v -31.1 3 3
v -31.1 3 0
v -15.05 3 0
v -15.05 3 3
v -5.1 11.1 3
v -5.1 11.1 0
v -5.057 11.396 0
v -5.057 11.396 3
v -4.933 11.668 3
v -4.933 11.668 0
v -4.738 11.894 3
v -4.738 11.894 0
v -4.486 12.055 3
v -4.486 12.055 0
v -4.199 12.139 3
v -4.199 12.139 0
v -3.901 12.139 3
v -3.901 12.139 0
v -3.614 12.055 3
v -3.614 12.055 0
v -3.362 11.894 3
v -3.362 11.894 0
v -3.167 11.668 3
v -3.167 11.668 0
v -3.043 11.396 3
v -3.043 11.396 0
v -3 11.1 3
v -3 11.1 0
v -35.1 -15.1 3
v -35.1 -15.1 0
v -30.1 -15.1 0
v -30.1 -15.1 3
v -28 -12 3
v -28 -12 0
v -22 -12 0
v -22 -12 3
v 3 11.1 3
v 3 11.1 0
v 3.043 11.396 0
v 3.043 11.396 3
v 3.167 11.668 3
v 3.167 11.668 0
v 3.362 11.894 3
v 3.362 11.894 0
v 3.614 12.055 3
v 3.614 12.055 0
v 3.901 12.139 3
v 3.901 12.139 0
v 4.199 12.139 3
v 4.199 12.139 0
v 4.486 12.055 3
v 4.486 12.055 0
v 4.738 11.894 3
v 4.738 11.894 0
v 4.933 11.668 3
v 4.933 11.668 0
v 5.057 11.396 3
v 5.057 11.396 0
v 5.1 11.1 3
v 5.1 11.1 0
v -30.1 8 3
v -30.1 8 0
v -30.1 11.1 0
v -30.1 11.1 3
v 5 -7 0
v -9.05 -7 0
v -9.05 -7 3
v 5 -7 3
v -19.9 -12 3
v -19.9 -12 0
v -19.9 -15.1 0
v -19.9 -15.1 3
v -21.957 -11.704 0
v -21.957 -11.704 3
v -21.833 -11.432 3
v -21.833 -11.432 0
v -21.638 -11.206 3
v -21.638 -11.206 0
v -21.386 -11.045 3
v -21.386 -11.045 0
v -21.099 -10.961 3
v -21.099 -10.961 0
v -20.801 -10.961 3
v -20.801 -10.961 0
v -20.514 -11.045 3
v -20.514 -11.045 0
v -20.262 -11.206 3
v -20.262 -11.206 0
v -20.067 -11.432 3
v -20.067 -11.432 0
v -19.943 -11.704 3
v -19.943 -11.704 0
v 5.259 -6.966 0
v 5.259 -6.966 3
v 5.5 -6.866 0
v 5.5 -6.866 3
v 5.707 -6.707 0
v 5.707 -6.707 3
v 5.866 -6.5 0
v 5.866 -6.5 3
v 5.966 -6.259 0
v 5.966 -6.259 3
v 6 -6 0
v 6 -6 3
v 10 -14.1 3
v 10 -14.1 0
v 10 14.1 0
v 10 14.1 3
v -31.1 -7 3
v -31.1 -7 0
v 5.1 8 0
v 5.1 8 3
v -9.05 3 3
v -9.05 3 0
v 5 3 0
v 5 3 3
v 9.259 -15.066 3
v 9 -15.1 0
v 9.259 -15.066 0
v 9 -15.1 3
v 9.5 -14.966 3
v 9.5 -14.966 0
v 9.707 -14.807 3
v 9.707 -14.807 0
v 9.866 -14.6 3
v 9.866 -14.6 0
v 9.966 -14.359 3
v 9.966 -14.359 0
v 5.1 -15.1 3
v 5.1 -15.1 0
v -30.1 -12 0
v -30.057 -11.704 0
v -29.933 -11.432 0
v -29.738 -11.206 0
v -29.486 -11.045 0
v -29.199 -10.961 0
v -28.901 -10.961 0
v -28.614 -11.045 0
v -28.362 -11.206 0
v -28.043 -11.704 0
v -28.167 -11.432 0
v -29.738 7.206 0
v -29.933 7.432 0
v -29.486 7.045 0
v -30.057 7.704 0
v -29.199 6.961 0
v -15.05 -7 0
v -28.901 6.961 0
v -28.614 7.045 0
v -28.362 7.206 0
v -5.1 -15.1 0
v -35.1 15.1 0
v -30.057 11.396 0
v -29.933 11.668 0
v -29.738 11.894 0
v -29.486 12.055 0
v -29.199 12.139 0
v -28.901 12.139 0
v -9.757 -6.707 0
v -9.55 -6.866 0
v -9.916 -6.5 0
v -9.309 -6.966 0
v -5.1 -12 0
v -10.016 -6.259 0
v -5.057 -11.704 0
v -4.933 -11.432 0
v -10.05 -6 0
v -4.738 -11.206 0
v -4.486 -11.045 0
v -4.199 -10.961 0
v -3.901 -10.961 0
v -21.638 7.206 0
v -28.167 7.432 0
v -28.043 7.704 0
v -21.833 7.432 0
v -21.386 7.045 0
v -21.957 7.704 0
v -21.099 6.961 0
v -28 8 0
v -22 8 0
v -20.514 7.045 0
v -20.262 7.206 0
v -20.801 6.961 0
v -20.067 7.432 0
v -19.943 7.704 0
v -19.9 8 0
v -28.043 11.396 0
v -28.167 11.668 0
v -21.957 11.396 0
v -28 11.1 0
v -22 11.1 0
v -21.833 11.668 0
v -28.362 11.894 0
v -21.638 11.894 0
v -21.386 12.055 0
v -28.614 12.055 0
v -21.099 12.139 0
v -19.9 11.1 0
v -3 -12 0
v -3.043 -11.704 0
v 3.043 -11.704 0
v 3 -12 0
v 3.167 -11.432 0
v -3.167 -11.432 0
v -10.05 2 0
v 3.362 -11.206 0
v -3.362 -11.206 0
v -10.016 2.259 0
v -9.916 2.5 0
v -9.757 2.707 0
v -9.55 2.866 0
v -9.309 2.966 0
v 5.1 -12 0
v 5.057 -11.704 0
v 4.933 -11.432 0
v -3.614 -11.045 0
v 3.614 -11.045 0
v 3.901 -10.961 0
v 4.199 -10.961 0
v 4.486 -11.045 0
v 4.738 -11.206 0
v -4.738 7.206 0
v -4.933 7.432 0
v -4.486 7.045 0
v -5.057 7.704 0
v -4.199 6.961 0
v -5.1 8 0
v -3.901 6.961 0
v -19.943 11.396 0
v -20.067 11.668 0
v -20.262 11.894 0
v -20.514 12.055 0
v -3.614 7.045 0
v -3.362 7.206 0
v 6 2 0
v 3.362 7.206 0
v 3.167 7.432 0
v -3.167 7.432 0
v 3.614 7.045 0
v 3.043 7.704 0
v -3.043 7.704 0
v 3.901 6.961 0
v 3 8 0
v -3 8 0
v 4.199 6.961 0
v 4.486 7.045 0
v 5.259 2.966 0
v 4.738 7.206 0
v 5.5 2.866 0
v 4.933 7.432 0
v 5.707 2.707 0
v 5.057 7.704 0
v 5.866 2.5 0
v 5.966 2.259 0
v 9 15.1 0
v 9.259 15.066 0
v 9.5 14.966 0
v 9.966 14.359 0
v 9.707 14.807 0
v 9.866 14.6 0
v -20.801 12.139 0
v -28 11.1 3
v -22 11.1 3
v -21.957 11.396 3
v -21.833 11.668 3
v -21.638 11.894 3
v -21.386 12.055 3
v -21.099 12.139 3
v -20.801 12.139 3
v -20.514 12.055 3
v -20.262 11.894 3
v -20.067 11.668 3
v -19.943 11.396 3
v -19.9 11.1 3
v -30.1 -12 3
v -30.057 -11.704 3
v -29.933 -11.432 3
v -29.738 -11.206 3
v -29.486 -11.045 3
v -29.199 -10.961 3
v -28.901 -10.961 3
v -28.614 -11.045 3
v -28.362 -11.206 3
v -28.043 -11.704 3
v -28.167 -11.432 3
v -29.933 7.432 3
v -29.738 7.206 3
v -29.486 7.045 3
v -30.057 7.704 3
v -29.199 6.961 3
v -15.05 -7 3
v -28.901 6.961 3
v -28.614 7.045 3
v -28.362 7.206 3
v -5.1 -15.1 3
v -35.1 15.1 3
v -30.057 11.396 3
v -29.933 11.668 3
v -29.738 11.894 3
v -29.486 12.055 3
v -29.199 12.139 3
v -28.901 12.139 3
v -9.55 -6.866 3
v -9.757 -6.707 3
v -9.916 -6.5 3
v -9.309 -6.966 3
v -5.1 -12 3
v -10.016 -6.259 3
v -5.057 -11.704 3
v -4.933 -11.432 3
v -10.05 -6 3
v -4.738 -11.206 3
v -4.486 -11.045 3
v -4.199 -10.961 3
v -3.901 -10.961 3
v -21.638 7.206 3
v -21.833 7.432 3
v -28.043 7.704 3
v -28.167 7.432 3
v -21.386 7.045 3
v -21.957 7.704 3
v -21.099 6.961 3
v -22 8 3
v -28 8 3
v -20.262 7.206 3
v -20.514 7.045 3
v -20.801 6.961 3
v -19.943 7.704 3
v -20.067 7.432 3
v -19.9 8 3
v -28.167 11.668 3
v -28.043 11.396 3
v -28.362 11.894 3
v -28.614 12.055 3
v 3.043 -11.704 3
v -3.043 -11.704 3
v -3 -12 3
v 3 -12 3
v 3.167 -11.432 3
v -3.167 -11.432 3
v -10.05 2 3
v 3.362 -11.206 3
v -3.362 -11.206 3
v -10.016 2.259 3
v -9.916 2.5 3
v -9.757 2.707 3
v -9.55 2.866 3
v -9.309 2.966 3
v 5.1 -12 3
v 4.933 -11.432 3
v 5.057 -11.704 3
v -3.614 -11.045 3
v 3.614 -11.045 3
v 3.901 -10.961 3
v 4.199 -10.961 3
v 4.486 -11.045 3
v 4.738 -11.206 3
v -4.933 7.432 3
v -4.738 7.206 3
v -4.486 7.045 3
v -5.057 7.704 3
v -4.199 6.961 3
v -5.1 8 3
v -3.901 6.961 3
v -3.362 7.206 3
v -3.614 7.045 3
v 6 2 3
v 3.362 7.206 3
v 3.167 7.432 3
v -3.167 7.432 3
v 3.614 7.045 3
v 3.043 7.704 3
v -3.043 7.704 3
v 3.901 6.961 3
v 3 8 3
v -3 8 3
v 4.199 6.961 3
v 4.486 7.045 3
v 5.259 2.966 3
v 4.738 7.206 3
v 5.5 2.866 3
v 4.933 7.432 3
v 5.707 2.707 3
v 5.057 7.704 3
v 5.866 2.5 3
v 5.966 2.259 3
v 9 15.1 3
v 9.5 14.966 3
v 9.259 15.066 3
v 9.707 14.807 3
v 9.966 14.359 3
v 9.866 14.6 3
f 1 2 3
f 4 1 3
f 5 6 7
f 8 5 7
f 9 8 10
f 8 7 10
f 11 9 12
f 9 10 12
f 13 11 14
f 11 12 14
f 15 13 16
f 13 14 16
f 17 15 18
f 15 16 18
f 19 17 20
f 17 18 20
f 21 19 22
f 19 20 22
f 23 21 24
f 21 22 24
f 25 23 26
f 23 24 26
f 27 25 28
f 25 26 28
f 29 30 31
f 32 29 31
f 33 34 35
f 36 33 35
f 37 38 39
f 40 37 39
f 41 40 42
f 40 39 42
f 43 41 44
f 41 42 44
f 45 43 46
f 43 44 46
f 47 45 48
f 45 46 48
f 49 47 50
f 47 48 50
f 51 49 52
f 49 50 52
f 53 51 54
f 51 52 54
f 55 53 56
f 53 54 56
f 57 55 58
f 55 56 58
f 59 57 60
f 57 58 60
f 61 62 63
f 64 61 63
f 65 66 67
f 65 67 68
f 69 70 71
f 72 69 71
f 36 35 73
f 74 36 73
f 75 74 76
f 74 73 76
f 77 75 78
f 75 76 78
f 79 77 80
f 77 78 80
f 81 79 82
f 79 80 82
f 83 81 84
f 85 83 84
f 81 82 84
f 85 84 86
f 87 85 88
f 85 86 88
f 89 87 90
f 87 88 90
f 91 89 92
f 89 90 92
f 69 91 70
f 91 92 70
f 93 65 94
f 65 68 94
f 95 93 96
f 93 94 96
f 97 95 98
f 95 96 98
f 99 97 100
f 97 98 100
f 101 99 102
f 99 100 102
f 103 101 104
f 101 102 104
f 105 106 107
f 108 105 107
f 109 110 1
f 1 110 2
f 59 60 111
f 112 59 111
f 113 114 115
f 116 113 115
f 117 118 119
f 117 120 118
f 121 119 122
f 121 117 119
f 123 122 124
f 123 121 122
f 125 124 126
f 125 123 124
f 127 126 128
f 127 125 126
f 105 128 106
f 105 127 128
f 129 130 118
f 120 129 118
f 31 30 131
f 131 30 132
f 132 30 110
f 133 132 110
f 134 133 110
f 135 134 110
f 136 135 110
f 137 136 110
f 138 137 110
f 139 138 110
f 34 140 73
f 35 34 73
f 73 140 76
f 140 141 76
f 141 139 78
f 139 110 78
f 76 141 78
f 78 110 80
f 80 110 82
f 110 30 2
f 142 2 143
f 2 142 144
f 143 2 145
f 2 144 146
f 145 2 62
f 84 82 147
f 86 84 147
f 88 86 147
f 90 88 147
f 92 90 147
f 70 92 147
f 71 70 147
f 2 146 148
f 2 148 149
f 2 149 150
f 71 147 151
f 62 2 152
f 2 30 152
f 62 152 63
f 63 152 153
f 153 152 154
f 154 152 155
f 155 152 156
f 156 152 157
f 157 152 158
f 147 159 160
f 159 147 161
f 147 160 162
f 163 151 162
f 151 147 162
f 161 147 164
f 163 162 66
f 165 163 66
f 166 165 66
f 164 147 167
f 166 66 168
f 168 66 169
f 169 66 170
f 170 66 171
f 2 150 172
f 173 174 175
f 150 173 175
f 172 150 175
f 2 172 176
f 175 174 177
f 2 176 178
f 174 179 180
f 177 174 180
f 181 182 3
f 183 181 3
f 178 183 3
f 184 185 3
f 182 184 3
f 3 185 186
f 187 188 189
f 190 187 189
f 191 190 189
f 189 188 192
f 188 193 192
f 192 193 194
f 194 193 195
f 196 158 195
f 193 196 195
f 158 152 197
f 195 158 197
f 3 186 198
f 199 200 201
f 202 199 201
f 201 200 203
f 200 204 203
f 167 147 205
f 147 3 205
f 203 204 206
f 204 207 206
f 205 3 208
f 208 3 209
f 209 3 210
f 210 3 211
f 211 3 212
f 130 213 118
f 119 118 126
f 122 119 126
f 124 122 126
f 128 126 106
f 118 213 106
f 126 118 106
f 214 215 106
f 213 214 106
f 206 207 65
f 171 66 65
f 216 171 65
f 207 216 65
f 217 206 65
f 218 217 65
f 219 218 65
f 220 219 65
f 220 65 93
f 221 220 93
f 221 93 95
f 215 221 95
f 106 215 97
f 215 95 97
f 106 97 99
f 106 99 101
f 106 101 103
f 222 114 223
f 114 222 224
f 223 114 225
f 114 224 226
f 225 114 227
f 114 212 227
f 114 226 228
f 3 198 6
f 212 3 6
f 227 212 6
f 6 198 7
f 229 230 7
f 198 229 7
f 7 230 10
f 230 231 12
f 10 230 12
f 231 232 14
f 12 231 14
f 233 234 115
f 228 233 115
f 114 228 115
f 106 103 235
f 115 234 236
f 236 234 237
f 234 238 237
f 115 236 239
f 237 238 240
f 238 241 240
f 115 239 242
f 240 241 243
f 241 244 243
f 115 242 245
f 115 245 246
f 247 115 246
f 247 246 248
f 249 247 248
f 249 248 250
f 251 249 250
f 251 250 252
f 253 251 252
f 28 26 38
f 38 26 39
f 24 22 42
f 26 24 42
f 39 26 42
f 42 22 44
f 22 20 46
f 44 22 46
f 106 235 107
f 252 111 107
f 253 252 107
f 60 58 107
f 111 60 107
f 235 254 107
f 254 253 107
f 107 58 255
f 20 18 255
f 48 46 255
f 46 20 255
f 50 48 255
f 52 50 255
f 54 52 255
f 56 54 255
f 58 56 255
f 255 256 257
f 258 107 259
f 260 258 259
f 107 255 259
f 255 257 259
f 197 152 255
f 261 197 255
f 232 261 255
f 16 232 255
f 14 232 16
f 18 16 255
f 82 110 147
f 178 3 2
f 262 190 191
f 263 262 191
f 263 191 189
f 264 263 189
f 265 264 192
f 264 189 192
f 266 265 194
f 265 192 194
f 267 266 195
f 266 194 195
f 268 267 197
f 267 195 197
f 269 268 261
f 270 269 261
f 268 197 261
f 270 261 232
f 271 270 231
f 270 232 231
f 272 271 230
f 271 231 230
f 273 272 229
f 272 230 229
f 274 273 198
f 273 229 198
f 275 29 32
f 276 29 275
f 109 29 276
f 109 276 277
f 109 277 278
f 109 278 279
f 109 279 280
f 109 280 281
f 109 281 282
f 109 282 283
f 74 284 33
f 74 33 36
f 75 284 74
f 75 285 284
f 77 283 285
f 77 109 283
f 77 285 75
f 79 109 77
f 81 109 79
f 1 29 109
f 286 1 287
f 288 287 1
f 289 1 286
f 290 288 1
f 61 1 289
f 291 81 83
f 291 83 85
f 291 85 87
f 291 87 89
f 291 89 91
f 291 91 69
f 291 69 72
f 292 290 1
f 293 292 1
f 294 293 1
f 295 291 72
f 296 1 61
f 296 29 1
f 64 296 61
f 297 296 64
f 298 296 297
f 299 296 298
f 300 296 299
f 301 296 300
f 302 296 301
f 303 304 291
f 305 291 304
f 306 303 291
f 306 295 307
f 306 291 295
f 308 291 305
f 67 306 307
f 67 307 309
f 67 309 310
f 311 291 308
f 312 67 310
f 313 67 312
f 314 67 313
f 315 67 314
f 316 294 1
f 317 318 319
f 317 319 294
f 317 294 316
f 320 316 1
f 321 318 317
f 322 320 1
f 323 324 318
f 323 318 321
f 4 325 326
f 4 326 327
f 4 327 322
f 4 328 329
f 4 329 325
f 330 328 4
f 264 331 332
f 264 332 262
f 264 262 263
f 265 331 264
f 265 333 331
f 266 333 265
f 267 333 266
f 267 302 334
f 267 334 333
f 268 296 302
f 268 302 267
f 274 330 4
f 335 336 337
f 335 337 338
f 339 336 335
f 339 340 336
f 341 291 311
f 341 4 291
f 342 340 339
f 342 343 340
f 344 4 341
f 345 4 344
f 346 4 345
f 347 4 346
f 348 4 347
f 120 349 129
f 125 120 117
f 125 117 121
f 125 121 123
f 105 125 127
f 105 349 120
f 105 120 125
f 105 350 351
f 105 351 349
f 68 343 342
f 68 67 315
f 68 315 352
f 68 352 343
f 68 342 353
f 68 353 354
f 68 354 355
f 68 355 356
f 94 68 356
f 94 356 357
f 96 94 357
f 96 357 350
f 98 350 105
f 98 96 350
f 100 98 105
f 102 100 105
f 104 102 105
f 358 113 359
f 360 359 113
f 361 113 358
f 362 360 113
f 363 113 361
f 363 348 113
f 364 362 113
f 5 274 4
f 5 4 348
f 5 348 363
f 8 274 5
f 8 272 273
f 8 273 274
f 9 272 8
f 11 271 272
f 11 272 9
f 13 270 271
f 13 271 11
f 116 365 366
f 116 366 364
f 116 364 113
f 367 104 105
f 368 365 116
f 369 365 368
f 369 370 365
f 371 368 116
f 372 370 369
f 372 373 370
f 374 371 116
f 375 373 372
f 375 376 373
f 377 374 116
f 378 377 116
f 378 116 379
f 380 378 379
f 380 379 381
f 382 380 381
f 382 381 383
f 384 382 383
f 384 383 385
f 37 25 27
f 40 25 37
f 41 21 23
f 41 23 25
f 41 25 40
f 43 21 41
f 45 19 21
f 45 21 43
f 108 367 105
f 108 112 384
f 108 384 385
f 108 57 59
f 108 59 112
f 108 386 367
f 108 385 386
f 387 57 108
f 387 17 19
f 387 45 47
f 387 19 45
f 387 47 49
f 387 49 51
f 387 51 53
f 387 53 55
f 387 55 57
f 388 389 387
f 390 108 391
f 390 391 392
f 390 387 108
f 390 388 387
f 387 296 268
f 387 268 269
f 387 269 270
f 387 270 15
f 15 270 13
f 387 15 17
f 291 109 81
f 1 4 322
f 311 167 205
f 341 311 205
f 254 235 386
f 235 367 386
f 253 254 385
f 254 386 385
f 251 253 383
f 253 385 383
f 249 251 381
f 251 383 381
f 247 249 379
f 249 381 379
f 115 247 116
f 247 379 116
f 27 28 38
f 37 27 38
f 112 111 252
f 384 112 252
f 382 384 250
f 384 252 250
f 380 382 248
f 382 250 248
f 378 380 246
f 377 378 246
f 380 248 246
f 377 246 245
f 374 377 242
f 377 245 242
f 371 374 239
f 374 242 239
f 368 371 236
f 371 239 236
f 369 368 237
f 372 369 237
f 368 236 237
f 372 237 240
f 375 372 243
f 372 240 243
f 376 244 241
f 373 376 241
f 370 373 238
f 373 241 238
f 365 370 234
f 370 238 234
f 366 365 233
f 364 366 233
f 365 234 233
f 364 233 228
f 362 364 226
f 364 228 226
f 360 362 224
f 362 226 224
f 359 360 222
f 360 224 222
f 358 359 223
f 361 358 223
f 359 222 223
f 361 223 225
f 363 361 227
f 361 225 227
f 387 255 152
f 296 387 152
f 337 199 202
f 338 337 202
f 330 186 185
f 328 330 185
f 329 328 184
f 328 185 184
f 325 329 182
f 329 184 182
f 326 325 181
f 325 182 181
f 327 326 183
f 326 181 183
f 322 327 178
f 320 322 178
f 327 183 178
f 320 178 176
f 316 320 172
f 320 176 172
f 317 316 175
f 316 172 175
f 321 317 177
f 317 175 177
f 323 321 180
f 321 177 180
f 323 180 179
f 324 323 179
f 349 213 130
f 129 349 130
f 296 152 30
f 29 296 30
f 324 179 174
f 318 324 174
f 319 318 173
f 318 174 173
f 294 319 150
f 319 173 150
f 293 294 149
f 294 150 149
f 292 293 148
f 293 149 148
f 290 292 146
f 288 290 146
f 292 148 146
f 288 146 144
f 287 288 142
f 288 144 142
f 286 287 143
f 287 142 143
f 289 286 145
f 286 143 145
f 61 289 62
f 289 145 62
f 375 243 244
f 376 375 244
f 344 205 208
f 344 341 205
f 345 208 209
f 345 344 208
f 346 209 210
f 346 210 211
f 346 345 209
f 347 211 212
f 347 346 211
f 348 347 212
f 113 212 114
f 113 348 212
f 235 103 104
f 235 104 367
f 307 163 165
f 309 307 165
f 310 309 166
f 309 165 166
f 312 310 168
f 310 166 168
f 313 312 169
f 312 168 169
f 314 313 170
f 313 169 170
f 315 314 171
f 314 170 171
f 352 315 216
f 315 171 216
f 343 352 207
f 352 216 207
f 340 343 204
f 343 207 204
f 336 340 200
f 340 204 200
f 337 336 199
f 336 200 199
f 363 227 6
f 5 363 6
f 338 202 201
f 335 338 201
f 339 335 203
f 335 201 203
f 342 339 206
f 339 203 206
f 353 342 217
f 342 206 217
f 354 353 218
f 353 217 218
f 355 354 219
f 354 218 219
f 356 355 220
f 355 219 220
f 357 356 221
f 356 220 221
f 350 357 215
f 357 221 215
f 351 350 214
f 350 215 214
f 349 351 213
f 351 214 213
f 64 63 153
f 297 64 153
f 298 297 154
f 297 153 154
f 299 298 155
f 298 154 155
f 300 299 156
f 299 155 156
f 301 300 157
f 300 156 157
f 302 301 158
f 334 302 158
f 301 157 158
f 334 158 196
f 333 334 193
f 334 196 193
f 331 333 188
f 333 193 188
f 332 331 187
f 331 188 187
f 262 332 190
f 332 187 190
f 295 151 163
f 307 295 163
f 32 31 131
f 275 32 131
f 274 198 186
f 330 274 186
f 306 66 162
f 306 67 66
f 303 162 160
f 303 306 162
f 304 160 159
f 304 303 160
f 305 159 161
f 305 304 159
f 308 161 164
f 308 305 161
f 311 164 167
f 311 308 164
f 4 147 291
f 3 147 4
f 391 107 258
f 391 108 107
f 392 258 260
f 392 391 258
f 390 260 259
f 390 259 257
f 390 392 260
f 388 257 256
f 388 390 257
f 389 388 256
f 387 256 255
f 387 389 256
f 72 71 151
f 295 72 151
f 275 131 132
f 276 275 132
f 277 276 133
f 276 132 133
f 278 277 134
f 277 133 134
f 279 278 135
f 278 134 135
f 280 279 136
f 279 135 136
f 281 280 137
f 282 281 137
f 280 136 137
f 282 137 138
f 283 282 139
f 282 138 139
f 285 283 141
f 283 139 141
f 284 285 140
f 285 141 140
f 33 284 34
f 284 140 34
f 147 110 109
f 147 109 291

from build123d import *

# Parameters (mm, degrees)
SKETCH_1_W      = 16.05
SKETCH_1_H      = 10
EXTRUDE_1_DEPTH = 3
FILLET_1_R      = 1


with BuildPart() as part:
    # 草图1 → 凸台-拉伸1 (new body)
    with BuildSketch(Plane.XY):
        with BuildLine():
            Line((-5.1, -15.1), (-5.1, -12))
            ThreePointArc((-5.1, -12), (-4.05, -10.95), (-3, -12))
            Line((-3, -12), (3, -12))
            ThreePointArc((3, -12), (4.05, -10.95), (5.1, -12))
            Line((5.1, -12), (5.1, -15.1))
            Line((5.1, -15.1), (10, -15.1))
            Line((10, -15.1), (10, 15.1))
            Line((10, 15.1), (-35.1, 15.1))
            Line((-35.1, 15.1), (-35.1, -15.1))
            Line((-35.1, -15.1), (-30.1, -15.1))
            Line((-30.1, -15.1), (-30.1, -12))
            ThreePointArc((-30.1, -12), (-29.05, -10.95), (-28, -12))
            Line((-28, -12), (-22, -12))
            ThreePointArc((-22, -12), (-20.95, -10.95), (-19.9, -12))
            Line((-19.9, -12), (-19.9, -15.1))
            Line((-19.9, -15.1), (-5.1, -15.1))
        make_face()
        with Locations((-2.025, -2)):
            Rectangle(SKETCH_1_W, SKETCH_1_H, mode=Mode.SUBTRACT)
        with BuildLine():
            Line((3, 8), (-3, 8))
            ThreePointArc((-3, 8), (-4.05, 6.95), (-5.1, 8))
            Line((-5.1, 8), (-5.1, 11.1))
            ThreePointArc((-5.1, 11.1), (-4.05, 12.15), (-3, 11.1))
            Line((-3, 11.1), (3, 11.1))
            ThreePointArc((3, 11.1), (4.05, 12.15), (5.1, 11.1))
            Line((5.1, 11.1), (5.1, 8))
            ThreePointArc((5.1, 8), (4.05, 6.95), (3, 8))
        make_face(mode=Mode.SUBTRACT)
        with BuildLine():
            ThreePointArc((-30.1, 11.1), (-29.05, 12.15), (-28, 11.1))
            Line((-28, 11.1), (-22, 11.1))
            ThreePointArc((-22, 11.1), (-20.95, 12.15), (-19.9, 11.1))
            Line((-19.9, 11.1), (-19.9, 8))
            ThreePointArc((-19.9, 8), (-20.95, 6.95), (-22, 8))
            Line((-22, 8), (-28, 8))
            ThreePointArc((-28, 8), (-29.05, 6.95), (-30.1, 8))
            Line((-30.1, 8), (-30.1, 11.1))
        make_face(mode=Mode.SUBTRACT)
        with Locations((-23.075, -2)):
            Rectangle(SKETCH_1_W, SKETCH_1_H, mode=Mode.SUBTRACT)
    extrude(amount=EXTRUDE_1_DEPTH)

    # 圆角1
    fillet_1_edges = [part.edges().sort_by_distance(p)[0] for p in [
        (6, -7, 1.5),
        (6, 3, 1.5),
        (-10.05, 3, 1.5),
        (-10.05, -7, 1.5),
        (10, 15.1, 1.5),
        (10, -15.1, 1.5),
    ]]
    fillet(fillet_1_edges, radius=FILLET_1_R)


solid = part.part
